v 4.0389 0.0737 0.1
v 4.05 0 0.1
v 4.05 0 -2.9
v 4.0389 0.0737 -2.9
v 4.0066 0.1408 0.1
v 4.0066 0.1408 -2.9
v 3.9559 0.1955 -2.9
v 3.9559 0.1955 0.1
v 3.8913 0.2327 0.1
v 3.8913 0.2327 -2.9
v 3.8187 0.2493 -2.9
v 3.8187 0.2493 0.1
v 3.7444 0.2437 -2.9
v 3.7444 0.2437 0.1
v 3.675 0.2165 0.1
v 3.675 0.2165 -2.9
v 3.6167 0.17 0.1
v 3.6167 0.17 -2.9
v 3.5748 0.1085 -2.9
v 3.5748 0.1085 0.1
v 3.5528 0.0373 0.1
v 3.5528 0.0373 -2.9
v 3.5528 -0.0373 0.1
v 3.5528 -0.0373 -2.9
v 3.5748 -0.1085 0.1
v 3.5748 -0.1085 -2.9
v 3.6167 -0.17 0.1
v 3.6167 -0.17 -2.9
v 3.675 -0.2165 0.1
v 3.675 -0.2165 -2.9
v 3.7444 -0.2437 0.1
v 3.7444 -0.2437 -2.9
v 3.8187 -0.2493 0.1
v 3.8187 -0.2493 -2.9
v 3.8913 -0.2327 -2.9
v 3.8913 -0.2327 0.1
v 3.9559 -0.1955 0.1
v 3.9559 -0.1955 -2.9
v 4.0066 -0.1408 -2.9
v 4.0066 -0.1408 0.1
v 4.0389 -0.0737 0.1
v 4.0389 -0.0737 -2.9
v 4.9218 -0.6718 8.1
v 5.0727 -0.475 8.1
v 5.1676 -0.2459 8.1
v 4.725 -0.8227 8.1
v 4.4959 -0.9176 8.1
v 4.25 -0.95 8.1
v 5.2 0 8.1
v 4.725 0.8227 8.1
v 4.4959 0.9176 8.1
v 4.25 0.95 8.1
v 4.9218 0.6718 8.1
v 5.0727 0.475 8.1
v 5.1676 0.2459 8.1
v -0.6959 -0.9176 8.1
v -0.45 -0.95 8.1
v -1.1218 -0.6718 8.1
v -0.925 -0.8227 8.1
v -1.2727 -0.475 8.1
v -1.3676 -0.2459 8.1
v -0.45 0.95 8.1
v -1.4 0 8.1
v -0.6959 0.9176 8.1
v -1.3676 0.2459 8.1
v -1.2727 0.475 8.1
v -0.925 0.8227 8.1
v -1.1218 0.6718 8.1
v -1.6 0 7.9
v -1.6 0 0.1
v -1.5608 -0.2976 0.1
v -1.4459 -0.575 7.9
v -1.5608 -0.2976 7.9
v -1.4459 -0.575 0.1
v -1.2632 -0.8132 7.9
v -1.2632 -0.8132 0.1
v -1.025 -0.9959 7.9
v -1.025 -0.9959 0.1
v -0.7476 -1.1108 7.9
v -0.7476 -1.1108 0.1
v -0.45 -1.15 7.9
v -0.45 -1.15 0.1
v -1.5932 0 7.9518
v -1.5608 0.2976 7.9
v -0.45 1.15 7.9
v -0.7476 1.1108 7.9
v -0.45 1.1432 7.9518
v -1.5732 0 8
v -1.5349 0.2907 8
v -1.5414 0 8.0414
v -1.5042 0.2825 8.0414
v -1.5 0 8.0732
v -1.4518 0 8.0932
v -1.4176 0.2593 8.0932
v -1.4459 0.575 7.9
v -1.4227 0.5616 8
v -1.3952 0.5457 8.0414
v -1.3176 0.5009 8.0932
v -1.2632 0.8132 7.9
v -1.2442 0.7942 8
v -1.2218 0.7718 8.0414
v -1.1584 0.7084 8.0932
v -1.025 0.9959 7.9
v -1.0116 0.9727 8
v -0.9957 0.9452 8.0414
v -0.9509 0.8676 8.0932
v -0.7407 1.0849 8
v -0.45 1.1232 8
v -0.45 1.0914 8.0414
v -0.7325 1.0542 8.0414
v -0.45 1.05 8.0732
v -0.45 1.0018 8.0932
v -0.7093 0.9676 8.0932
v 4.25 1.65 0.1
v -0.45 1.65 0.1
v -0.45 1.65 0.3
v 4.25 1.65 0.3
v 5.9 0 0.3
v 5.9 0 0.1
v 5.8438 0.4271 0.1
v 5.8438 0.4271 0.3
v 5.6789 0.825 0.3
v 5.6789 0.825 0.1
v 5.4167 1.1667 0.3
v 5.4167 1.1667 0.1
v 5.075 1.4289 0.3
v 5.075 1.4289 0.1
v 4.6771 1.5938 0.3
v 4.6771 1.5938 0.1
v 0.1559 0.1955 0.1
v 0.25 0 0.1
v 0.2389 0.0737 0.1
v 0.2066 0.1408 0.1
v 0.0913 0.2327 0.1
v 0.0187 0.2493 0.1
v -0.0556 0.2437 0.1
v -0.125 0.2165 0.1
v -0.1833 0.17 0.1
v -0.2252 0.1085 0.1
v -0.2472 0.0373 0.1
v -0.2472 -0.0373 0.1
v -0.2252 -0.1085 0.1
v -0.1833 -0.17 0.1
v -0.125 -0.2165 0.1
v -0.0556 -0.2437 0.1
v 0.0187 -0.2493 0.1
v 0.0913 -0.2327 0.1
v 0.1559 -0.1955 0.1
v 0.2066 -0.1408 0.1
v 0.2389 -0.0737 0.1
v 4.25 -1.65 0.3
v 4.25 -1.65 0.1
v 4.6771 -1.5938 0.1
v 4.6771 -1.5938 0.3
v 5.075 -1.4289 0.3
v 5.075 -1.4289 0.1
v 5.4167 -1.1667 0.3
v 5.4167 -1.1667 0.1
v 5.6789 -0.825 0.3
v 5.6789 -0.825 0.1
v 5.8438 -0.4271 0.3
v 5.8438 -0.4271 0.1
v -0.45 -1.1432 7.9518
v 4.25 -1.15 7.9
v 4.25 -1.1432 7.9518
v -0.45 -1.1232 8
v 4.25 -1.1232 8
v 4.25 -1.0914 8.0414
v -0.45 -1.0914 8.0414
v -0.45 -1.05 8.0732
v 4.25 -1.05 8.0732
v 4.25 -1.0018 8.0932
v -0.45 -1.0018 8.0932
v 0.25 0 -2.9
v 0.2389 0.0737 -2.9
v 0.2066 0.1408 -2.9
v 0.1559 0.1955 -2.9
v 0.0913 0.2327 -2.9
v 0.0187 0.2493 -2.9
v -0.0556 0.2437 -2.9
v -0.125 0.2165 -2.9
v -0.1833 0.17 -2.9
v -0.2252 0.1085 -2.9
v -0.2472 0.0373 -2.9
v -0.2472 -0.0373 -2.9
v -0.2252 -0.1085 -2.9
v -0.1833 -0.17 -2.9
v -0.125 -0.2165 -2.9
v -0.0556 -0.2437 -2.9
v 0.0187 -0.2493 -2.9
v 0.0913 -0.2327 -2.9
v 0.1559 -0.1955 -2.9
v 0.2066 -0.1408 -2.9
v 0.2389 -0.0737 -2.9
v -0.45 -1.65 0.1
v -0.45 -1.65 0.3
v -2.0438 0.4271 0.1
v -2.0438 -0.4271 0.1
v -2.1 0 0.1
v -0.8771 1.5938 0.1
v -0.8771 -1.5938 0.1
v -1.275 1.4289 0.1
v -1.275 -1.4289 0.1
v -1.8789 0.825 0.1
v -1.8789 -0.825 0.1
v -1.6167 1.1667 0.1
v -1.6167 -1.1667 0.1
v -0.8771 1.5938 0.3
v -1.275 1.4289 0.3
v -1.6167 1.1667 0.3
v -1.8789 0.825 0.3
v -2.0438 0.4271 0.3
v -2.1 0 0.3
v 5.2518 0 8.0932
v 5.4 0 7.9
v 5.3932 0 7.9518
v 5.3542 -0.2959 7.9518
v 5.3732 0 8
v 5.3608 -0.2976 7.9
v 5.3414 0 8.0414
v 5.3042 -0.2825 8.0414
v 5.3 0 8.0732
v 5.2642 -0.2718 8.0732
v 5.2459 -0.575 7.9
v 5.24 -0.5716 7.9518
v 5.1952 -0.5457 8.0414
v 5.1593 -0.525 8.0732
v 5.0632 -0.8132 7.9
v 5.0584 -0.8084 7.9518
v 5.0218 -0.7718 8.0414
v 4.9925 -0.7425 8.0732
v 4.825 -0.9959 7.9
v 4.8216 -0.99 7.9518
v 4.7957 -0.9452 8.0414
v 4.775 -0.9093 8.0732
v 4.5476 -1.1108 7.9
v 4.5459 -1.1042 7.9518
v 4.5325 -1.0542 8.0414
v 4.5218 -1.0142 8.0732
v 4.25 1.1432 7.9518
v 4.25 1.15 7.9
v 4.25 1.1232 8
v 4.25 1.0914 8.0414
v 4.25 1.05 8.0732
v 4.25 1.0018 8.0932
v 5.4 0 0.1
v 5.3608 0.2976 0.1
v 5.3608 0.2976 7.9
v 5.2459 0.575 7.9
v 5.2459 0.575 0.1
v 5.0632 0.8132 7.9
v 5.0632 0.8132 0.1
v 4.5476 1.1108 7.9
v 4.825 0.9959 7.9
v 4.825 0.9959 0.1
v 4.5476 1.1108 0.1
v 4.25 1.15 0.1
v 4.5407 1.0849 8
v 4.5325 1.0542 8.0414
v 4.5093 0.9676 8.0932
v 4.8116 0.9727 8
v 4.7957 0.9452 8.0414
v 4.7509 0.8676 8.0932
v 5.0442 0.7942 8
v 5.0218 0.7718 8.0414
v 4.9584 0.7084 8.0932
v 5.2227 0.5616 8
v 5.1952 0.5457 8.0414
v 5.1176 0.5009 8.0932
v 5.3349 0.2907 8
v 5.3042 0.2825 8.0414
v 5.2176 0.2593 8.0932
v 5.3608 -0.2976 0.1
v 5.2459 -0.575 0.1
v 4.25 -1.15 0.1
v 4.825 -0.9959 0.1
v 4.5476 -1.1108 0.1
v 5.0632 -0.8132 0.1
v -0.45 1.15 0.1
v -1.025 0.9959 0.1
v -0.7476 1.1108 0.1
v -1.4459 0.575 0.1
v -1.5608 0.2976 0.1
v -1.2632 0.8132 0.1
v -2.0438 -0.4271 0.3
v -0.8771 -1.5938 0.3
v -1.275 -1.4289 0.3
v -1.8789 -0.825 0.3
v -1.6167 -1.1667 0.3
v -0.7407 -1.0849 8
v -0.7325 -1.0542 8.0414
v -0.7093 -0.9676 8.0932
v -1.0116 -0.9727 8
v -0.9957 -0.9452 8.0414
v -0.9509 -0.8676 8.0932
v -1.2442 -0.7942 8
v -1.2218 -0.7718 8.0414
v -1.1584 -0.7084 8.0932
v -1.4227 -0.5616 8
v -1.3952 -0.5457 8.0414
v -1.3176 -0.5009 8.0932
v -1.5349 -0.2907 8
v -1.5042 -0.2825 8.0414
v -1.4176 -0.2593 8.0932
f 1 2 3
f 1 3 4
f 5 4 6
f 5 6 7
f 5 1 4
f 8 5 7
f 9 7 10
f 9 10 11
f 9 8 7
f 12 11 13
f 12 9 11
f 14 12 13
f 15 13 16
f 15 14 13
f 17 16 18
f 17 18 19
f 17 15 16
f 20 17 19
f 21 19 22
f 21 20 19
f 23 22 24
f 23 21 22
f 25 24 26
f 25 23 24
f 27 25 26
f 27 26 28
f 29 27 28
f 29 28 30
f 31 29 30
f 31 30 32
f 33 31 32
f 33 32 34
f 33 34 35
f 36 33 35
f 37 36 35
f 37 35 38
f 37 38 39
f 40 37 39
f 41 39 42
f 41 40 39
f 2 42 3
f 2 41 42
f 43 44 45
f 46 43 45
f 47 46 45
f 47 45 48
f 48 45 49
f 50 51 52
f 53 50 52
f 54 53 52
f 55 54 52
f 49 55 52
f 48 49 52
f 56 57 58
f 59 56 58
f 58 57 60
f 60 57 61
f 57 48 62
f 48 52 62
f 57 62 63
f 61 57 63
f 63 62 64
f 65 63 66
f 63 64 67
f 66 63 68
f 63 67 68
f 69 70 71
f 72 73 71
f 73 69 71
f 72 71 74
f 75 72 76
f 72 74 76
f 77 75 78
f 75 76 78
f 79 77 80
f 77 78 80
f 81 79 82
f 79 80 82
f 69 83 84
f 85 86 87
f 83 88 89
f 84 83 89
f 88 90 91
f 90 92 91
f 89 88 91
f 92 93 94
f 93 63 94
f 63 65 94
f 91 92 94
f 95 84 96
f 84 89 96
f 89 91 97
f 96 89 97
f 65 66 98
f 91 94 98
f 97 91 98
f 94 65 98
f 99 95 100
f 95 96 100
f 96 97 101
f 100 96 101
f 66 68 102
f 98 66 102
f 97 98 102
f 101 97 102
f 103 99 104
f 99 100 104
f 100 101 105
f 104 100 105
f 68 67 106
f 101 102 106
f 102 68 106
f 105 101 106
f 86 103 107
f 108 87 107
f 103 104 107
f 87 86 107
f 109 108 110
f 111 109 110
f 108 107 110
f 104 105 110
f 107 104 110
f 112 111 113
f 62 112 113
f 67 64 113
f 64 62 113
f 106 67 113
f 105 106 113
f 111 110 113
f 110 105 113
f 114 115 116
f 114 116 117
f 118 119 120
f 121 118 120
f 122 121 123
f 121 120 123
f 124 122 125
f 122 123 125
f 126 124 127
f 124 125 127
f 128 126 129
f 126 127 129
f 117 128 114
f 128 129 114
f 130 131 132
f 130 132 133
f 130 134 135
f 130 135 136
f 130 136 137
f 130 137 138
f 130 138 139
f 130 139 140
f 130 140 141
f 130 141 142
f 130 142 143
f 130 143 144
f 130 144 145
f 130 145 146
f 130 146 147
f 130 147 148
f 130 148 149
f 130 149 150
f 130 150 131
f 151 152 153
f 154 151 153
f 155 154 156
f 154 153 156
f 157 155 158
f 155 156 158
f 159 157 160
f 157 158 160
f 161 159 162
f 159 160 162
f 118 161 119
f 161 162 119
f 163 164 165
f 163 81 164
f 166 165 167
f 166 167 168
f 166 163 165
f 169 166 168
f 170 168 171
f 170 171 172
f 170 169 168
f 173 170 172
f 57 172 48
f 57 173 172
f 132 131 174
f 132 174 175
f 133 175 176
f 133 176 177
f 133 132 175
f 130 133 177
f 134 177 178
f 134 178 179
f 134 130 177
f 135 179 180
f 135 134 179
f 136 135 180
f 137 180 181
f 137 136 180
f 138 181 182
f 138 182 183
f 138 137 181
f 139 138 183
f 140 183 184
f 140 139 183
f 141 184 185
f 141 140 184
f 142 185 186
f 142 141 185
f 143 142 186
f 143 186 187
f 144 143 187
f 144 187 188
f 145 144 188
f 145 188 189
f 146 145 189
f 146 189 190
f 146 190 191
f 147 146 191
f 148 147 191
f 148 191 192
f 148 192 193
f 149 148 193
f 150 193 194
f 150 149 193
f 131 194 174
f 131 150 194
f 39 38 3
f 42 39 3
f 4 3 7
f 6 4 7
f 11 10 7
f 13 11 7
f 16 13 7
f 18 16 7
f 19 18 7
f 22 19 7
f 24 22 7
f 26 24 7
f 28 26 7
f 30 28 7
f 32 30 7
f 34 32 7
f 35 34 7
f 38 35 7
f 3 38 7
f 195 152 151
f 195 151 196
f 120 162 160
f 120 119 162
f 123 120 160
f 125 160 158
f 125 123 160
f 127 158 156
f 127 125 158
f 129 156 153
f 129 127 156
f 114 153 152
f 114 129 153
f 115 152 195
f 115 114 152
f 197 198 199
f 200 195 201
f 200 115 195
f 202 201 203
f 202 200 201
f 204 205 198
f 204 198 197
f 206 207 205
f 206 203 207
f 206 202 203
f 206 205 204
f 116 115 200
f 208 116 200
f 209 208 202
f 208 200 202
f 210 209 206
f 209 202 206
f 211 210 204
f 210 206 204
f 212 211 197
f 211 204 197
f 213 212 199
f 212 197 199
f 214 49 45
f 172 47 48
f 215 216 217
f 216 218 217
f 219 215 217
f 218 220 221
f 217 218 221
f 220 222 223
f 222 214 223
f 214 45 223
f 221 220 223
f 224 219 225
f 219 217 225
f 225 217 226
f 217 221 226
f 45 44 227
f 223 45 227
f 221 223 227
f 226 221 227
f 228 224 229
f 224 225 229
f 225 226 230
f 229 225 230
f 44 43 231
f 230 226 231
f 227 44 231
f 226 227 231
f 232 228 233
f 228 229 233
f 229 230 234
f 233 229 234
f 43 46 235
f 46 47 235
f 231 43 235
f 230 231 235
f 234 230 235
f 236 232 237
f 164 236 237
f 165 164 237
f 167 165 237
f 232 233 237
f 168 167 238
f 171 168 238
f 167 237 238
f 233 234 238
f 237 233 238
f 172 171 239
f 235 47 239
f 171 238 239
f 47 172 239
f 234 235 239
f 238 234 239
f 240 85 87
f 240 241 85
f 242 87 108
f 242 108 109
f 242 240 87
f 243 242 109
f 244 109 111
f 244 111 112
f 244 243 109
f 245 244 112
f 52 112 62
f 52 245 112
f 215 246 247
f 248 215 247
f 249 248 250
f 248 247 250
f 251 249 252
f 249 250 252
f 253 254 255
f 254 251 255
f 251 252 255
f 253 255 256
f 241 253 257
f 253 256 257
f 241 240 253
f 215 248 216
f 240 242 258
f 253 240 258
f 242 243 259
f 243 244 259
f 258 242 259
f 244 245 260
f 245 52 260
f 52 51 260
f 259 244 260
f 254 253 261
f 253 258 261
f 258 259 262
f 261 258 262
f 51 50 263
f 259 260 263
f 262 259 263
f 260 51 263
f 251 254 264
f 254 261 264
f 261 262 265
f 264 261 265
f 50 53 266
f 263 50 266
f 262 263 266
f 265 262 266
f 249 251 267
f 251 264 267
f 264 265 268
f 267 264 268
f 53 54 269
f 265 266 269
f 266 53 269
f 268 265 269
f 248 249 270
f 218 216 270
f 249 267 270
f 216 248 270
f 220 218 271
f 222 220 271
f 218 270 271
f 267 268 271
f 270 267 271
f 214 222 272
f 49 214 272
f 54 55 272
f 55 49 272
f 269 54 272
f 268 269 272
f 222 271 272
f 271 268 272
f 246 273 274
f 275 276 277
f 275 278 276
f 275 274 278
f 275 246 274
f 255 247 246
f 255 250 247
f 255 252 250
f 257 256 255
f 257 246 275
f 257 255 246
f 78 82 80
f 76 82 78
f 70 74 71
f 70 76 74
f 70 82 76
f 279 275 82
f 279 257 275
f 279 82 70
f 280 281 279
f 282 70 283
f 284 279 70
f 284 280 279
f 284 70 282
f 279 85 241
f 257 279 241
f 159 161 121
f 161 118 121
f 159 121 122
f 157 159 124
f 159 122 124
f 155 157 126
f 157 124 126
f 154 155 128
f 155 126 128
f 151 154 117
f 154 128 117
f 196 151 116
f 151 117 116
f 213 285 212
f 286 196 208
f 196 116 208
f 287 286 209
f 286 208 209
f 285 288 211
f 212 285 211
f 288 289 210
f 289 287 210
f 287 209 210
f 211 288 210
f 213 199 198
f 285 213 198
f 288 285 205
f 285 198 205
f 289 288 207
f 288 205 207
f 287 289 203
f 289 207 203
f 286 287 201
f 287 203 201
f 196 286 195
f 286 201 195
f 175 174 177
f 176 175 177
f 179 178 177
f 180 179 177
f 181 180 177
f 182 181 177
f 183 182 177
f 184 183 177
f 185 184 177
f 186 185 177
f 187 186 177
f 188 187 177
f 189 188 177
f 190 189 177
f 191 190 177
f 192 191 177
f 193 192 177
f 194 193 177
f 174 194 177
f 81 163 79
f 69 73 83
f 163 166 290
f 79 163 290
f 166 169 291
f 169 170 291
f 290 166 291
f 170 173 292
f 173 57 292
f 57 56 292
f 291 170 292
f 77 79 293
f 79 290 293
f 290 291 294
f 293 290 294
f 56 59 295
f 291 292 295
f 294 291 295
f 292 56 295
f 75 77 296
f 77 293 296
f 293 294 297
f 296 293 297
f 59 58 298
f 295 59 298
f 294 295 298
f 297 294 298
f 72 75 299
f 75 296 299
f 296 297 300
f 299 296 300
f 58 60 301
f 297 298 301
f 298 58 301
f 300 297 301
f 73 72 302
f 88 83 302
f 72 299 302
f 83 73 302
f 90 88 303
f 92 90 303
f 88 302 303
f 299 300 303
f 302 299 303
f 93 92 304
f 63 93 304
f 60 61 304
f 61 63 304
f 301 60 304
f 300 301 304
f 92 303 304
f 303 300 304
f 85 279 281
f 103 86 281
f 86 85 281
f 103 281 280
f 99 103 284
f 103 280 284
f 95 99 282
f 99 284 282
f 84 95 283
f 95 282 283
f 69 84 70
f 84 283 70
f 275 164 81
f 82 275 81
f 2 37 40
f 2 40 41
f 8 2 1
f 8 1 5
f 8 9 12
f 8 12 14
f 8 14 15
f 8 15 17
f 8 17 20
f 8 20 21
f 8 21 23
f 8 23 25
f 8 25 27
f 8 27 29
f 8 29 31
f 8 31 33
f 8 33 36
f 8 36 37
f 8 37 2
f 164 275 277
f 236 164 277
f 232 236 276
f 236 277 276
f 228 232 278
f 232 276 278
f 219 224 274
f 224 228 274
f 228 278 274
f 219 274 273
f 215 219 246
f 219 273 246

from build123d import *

# Parameters (mm, degrees)
SKETCH_R     = 0.25
PAD_DEPTH    = 3
PAD001_DEPTH = 0.2
PAD002_DEPTH = 8
FILLET_R     = 0.2


with BuildPart() as pad:
    # Sketch → Pad (new body)
    with BuildSketch(Plane.XY.offset(0.1)):
        Circle(SKETCH_R)
        with Locations((3.8, 0)):
            Circle(SKETCH_R)
    extrude(amount=-PAD_DEPTH)


with BuildPart() as pad001:
    # Sketch001 → Pad001 (new body)
    with BuildSketch(Plane.XY.offset(0.1)):
        with BuildLine():
            Line((-0.45, 1.65), (4.25, 1.65))
            ThreePointArc((5.9, 0), (5.416726, 1.166726), (4.25, 1.65))
            ThreePointArc((4.25, -1.65), (5.416726, -1.166726), (5.9, 0))
            Line((4.25, -1.65), (-0.45, -1.65))
            ThreePointArc((-2.1, 0), (-1.616726, -1.166726), (-0.45, -1.65))
            ThreePointArc((-0.45, 1.65), (-1.616726, 1.166726), (-2.1, 0))
        make_face()
    extrude(amount=PAD001_DEPTH)


with BuildPart() as fillet_body:
    # Sketch003 → Pad002 (new body)
    with BuildSketch(Plane.XY.offset(0.1)):
        with BuildLine():
            Line((-0.45, 1.15), (4.25, 1.15))
            ThreePointArc((5.4, 0), (5.063173, 0.813173), (4.25, 1.15))
            ThreePointArc((4.25, -1.15), (5.063173, -0.813173), (5.4, 0))
            Line((4.25, -1.15), (-0.45, -1.15))
            ThreePointArc((-1.6, 0), (-1.263173, -0.813173), (-0.45, -1.15))
            ThreePointArc((-0.45, 1.15), (-1.263173, 0.813173), (-1.6, 0))
        make_face()
    extrude(amount=PAD002_DEPTH)

    # Fillet
    fillet_edges = [fillet_body.edges().sort_by_distance(p)[0] for p in [
        (1.9, 1.15, 8.1),
        (-1.263173, 0.813173, 8.1),
        (-1.263173, -0.813173, 8.1),
        (1.9, -1.15, 8.1),
        (5.063173, -0.813173, 8.1),
        (5.063173, 0.813173, 8.1),
    ]]
    fillet(fillet_edges, radius=FILLET_R)


solid = Compound([pad.part, pad001.part, fillet_body.part])
